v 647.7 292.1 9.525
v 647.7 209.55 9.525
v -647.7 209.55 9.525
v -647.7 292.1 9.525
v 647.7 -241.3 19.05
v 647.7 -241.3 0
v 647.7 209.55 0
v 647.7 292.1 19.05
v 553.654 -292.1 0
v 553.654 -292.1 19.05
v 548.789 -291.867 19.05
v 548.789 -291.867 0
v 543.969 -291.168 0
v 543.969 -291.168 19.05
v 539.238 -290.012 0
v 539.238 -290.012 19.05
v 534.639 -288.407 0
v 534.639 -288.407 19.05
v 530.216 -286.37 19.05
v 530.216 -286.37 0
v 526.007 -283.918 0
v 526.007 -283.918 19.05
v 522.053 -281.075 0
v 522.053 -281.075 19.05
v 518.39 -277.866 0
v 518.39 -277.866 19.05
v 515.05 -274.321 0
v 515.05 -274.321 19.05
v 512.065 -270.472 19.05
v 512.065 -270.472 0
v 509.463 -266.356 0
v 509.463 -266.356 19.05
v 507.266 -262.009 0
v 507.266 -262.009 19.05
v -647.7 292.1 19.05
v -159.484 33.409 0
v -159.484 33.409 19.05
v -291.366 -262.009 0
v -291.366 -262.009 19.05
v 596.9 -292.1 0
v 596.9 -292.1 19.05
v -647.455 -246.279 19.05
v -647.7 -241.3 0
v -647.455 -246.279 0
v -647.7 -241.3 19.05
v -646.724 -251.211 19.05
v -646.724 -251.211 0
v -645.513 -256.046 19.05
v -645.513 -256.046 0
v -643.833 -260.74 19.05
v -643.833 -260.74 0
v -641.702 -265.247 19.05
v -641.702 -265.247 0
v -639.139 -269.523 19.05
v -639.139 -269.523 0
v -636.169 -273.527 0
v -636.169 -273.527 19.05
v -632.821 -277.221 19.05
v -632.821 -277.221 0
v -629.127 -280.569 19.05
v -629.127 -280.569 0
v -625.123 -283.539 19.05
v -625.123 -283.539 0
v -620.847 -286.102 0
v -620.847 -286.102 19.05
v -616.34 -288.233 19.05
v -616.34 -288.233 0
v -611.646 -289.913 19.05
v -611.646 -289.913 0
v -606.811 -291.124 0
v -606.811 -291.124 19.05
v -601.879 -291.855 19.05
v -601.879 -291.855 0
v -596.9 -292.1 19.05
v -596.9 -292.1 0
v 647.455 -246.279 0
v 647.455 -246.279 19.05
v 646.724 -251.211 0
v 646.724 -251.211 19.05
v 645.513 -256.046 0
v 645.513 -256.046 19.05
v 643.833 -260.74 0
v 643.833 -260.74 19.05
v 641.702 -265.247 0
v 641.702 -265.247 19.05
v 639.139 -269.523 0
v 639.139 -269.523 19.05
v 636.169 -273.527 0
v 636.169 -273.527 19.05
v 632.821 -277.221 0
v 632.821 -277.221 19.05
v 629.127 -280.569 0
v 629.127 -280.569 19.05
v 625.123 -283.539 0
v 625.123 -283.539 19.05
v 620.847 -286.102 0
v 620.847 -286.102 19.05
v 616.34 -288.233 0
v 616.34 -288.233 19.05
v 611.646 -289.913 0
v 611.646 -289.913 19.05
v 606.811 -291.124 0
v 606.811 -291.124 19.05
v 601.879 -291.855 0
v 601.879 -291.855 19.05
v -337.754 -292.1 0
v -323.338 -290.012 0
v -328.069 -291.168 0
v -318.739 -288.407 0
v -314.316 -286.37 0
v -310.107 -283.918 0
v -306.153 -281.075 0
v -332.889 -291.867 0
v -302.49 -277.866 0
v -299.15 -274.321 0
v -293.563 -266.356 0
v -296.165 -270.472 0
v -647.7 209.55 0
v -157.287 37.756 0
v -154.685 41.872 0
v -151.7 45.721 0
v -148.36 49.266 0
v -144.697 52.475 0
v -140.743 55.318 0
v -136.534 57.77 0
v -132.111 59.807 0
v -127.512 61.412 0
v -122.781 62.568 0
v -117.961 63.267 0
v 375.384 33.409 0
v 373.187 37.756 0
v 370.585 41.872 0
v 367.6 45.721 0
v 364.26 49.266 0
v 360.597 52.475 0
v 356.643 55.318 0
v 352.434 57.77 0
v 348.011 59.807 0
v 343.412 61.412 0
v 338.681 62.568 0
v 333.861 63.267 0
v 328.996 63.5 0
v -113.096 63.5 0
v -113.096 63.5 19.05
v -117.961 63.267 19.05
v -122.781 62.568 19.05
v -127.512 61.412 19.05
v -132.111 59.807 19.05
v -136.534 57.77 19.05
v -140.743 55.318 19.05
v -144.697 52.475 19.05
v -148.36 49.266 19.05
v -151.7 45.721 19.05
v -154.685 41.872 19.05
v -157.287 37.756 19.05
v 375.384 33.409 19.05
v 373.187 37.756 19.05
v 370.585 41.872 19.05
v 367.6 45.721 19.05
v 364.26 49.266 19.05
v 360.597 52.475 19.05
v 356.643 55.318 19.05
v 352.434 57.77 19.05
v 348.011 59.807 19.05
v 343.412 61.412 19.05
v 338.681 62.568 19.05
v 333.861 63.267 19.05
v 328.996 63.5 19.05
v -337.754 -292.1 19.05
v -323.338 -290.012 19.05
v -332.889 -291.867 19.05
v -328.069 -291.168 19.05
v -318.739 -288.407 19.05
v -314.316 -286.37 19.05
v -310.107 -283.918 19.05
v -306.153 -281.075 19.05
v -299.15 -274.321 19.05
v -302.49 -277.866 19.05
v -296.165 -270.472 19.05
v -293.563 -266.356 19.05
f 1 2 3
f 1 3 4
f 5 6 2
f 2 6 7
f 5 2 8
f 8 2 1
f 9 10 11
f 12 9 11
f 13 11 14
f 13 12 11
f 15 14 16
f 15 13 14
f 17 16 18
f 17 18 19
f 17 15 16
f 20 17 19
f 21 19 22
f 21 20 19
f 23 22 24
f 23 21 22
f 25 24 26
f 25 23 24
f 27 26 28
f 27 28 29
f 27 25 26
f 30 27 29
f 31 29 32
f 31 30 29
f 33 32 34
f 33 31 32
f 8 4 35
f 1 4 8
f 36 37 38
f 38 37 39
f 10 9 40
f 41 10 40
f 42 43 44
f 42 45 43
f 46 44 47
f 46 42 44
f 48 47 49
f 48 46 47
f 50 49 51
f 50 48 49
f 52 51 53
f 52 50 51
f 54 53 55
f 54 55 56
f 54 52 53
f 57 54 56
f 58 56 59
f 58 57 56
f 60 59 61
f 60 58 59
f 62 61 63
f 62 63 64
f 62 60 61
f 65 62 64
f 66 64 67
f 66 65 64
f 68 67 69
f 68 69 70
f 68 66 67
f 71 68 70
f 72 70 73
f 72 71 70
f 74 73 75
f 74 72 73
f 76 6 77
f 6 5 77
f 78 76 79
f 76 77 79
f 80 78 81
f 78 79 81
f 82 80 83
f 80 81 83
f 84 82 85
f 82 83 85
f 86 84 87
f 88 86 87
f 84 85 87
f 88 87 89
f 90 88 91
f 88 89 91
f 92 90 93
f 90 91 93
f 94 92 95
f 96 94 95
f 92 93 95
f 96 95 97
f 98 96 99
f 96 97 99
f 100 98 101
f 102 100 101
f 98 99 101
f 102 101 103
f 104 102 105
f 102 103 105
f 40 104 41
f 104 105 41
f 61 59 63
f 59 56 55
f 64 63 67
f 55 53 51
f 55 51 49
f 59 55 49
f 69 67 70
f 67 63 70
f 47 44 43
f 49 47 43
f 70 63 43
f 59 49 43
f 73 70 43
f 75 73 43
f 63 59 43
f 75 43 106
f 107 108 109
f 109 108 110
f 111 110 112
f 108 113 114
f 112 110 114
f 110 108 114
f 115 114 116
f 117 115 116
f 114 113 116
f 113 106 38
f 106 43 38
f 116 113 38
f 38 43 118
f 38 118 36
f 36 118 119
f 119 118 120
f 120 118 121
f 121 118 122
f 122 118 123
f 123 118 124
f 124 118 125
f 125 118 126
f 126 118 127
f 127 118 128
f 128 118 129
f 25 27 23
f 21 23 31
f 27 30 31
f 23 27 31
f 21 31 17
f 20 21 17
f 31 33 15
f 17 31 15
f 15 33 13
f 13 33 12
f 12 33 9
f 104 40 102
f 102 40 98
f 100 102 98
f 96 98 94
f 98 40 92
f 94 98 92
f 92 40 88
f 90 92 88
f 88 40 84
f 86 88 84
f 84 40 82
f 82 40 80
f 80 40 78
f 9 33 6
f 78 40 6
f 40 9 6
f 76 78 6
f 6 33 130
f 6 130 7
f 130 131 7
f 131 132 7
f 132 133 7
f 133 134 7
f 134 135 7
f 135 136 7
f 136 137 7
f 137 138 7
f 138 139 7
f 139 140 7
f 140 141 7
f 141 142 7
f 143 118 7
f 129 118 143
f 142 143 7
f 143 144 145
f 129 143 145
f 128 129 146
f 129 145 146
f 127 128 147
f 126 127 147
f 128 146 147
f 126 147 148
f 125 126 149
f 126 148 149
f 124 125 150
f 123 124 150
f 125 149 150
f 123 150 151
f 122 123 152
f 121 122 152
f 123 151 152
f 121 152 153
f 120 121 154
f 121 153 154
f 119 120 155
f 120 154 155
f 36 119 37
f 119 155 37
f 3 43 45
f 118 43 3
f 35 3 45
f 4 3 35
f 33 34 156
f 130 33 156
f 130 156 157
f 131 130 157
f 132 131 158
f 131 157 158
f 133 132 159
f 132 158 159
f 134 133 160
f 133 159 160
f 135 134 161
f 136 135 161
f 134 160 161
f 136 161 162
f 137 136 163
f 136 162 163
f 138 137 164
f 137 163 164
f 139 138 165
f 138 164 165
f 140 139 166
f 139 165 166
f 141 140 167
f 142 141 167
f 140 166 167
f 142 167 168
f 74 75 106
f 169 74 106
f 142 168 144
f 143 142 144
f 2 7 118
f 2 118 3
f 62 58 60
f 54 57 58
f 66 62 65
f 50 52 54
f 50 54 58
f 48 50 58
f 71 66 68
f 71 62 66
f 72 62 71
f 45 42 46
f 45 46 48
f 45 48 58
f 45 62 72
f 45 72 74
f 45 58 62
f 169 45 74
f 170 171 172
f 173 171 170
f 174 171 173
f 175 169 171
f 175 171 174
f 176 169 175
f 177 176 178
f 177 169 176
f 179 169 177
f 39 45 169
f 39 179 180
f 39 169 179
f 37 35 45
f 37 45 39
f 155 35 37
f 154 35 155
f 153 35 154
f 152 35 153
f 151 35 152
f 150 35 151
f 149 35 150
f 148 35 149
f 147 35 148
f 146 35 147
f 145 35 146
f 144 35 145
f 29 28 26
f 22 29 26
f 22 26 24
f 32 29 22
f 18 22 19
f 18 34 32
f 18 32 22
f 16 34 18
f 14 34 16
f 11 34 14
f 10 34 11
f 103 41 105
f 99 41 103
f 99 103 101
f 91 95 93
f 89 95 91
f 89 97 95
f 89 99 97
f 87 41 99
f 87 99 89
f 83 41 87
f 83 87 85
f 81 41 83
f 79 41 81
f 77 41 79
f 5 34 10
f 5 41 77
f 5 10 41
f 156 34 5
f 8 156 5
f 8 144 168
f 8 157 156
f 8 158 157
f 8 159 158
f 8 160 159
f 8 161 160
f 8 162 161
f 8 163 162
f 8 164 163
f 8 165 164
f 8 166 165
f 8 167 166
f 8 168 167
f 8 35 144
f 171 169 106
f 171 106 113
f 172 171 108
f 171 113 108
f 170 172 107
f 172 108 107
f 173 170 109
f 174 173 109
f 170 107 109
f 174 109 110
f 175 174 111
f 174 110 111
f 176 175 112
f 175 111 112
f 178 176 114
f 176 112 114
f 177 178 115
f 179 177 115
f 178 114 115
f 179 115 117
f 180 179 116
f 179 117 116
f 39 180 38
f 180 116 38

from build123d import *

# Parameters (mm, degrees)
F0_W     = 1295.4
F0_H     = 584.2
F1_DEPTH = 19.05
F3_DEPTH = 25.4
F4_R     = 50.8
F5_W     = 82.55
F5_H     = 9.525
F6_DEPTH = 1295.401


with BuildPart() as f1:
    # F0 (on Top) → F1 (new body)
    with BuildSketch(Plane.XY):
        Rectangle(F0_W, F0_H)
    extrude(amount=F1_DEPTH)

    # F2 (on face) → F3 (cut)
    with BuildSketch(Plane.XY.offset(19.05)):
        with BuildLine():
            Line((-159.4836327272, 33.408662691), (-304.8, -292.1))
            Line((-304.8, -292.1), (520.7, -292.1))
            Line((520.7, -292.1), (375.3836327272, 33.408662691))
            ThreePointArc((375.3836327272, 33.408662691), (356.6425656273, 55.3183063055), (328.9962282994, 63.5))
            Line((328.9962282994, 63.5), (-113.0962282994, 63.5))
            ThreePointArc((-113.0962282994, 63.5), (-140.7425656273, 55.3183063055), (-159.4836327272, 33.408662691))
        make_face()
    extrude(amount=-F3_DEPTH, mode=Mode.SUBTRACT)

    # F4
    f4_edges = [f1.edges().sort_by_distance(p)[0] for p in [
        (-304.8, -292.1, 9.525),
        (520.7, -292.1, 9.525),
        (647.7, -292.1, 9.525),
        (-647.7, -292.1, 9.525),
    ]]
    fillet(f4_edges, radius=F4_R)

    # F5 (on face) → F6 (cut, through all)
    with BuildSketch(Plane.YZ.offset(647.7)):
        with Locations((250.825, 4.7625)):
            Rectangle(F5_W, F5_H)
    extrude(amount=-F6_DEPTH, mode=Mode.SUBTRACT)


solid = f1.part
